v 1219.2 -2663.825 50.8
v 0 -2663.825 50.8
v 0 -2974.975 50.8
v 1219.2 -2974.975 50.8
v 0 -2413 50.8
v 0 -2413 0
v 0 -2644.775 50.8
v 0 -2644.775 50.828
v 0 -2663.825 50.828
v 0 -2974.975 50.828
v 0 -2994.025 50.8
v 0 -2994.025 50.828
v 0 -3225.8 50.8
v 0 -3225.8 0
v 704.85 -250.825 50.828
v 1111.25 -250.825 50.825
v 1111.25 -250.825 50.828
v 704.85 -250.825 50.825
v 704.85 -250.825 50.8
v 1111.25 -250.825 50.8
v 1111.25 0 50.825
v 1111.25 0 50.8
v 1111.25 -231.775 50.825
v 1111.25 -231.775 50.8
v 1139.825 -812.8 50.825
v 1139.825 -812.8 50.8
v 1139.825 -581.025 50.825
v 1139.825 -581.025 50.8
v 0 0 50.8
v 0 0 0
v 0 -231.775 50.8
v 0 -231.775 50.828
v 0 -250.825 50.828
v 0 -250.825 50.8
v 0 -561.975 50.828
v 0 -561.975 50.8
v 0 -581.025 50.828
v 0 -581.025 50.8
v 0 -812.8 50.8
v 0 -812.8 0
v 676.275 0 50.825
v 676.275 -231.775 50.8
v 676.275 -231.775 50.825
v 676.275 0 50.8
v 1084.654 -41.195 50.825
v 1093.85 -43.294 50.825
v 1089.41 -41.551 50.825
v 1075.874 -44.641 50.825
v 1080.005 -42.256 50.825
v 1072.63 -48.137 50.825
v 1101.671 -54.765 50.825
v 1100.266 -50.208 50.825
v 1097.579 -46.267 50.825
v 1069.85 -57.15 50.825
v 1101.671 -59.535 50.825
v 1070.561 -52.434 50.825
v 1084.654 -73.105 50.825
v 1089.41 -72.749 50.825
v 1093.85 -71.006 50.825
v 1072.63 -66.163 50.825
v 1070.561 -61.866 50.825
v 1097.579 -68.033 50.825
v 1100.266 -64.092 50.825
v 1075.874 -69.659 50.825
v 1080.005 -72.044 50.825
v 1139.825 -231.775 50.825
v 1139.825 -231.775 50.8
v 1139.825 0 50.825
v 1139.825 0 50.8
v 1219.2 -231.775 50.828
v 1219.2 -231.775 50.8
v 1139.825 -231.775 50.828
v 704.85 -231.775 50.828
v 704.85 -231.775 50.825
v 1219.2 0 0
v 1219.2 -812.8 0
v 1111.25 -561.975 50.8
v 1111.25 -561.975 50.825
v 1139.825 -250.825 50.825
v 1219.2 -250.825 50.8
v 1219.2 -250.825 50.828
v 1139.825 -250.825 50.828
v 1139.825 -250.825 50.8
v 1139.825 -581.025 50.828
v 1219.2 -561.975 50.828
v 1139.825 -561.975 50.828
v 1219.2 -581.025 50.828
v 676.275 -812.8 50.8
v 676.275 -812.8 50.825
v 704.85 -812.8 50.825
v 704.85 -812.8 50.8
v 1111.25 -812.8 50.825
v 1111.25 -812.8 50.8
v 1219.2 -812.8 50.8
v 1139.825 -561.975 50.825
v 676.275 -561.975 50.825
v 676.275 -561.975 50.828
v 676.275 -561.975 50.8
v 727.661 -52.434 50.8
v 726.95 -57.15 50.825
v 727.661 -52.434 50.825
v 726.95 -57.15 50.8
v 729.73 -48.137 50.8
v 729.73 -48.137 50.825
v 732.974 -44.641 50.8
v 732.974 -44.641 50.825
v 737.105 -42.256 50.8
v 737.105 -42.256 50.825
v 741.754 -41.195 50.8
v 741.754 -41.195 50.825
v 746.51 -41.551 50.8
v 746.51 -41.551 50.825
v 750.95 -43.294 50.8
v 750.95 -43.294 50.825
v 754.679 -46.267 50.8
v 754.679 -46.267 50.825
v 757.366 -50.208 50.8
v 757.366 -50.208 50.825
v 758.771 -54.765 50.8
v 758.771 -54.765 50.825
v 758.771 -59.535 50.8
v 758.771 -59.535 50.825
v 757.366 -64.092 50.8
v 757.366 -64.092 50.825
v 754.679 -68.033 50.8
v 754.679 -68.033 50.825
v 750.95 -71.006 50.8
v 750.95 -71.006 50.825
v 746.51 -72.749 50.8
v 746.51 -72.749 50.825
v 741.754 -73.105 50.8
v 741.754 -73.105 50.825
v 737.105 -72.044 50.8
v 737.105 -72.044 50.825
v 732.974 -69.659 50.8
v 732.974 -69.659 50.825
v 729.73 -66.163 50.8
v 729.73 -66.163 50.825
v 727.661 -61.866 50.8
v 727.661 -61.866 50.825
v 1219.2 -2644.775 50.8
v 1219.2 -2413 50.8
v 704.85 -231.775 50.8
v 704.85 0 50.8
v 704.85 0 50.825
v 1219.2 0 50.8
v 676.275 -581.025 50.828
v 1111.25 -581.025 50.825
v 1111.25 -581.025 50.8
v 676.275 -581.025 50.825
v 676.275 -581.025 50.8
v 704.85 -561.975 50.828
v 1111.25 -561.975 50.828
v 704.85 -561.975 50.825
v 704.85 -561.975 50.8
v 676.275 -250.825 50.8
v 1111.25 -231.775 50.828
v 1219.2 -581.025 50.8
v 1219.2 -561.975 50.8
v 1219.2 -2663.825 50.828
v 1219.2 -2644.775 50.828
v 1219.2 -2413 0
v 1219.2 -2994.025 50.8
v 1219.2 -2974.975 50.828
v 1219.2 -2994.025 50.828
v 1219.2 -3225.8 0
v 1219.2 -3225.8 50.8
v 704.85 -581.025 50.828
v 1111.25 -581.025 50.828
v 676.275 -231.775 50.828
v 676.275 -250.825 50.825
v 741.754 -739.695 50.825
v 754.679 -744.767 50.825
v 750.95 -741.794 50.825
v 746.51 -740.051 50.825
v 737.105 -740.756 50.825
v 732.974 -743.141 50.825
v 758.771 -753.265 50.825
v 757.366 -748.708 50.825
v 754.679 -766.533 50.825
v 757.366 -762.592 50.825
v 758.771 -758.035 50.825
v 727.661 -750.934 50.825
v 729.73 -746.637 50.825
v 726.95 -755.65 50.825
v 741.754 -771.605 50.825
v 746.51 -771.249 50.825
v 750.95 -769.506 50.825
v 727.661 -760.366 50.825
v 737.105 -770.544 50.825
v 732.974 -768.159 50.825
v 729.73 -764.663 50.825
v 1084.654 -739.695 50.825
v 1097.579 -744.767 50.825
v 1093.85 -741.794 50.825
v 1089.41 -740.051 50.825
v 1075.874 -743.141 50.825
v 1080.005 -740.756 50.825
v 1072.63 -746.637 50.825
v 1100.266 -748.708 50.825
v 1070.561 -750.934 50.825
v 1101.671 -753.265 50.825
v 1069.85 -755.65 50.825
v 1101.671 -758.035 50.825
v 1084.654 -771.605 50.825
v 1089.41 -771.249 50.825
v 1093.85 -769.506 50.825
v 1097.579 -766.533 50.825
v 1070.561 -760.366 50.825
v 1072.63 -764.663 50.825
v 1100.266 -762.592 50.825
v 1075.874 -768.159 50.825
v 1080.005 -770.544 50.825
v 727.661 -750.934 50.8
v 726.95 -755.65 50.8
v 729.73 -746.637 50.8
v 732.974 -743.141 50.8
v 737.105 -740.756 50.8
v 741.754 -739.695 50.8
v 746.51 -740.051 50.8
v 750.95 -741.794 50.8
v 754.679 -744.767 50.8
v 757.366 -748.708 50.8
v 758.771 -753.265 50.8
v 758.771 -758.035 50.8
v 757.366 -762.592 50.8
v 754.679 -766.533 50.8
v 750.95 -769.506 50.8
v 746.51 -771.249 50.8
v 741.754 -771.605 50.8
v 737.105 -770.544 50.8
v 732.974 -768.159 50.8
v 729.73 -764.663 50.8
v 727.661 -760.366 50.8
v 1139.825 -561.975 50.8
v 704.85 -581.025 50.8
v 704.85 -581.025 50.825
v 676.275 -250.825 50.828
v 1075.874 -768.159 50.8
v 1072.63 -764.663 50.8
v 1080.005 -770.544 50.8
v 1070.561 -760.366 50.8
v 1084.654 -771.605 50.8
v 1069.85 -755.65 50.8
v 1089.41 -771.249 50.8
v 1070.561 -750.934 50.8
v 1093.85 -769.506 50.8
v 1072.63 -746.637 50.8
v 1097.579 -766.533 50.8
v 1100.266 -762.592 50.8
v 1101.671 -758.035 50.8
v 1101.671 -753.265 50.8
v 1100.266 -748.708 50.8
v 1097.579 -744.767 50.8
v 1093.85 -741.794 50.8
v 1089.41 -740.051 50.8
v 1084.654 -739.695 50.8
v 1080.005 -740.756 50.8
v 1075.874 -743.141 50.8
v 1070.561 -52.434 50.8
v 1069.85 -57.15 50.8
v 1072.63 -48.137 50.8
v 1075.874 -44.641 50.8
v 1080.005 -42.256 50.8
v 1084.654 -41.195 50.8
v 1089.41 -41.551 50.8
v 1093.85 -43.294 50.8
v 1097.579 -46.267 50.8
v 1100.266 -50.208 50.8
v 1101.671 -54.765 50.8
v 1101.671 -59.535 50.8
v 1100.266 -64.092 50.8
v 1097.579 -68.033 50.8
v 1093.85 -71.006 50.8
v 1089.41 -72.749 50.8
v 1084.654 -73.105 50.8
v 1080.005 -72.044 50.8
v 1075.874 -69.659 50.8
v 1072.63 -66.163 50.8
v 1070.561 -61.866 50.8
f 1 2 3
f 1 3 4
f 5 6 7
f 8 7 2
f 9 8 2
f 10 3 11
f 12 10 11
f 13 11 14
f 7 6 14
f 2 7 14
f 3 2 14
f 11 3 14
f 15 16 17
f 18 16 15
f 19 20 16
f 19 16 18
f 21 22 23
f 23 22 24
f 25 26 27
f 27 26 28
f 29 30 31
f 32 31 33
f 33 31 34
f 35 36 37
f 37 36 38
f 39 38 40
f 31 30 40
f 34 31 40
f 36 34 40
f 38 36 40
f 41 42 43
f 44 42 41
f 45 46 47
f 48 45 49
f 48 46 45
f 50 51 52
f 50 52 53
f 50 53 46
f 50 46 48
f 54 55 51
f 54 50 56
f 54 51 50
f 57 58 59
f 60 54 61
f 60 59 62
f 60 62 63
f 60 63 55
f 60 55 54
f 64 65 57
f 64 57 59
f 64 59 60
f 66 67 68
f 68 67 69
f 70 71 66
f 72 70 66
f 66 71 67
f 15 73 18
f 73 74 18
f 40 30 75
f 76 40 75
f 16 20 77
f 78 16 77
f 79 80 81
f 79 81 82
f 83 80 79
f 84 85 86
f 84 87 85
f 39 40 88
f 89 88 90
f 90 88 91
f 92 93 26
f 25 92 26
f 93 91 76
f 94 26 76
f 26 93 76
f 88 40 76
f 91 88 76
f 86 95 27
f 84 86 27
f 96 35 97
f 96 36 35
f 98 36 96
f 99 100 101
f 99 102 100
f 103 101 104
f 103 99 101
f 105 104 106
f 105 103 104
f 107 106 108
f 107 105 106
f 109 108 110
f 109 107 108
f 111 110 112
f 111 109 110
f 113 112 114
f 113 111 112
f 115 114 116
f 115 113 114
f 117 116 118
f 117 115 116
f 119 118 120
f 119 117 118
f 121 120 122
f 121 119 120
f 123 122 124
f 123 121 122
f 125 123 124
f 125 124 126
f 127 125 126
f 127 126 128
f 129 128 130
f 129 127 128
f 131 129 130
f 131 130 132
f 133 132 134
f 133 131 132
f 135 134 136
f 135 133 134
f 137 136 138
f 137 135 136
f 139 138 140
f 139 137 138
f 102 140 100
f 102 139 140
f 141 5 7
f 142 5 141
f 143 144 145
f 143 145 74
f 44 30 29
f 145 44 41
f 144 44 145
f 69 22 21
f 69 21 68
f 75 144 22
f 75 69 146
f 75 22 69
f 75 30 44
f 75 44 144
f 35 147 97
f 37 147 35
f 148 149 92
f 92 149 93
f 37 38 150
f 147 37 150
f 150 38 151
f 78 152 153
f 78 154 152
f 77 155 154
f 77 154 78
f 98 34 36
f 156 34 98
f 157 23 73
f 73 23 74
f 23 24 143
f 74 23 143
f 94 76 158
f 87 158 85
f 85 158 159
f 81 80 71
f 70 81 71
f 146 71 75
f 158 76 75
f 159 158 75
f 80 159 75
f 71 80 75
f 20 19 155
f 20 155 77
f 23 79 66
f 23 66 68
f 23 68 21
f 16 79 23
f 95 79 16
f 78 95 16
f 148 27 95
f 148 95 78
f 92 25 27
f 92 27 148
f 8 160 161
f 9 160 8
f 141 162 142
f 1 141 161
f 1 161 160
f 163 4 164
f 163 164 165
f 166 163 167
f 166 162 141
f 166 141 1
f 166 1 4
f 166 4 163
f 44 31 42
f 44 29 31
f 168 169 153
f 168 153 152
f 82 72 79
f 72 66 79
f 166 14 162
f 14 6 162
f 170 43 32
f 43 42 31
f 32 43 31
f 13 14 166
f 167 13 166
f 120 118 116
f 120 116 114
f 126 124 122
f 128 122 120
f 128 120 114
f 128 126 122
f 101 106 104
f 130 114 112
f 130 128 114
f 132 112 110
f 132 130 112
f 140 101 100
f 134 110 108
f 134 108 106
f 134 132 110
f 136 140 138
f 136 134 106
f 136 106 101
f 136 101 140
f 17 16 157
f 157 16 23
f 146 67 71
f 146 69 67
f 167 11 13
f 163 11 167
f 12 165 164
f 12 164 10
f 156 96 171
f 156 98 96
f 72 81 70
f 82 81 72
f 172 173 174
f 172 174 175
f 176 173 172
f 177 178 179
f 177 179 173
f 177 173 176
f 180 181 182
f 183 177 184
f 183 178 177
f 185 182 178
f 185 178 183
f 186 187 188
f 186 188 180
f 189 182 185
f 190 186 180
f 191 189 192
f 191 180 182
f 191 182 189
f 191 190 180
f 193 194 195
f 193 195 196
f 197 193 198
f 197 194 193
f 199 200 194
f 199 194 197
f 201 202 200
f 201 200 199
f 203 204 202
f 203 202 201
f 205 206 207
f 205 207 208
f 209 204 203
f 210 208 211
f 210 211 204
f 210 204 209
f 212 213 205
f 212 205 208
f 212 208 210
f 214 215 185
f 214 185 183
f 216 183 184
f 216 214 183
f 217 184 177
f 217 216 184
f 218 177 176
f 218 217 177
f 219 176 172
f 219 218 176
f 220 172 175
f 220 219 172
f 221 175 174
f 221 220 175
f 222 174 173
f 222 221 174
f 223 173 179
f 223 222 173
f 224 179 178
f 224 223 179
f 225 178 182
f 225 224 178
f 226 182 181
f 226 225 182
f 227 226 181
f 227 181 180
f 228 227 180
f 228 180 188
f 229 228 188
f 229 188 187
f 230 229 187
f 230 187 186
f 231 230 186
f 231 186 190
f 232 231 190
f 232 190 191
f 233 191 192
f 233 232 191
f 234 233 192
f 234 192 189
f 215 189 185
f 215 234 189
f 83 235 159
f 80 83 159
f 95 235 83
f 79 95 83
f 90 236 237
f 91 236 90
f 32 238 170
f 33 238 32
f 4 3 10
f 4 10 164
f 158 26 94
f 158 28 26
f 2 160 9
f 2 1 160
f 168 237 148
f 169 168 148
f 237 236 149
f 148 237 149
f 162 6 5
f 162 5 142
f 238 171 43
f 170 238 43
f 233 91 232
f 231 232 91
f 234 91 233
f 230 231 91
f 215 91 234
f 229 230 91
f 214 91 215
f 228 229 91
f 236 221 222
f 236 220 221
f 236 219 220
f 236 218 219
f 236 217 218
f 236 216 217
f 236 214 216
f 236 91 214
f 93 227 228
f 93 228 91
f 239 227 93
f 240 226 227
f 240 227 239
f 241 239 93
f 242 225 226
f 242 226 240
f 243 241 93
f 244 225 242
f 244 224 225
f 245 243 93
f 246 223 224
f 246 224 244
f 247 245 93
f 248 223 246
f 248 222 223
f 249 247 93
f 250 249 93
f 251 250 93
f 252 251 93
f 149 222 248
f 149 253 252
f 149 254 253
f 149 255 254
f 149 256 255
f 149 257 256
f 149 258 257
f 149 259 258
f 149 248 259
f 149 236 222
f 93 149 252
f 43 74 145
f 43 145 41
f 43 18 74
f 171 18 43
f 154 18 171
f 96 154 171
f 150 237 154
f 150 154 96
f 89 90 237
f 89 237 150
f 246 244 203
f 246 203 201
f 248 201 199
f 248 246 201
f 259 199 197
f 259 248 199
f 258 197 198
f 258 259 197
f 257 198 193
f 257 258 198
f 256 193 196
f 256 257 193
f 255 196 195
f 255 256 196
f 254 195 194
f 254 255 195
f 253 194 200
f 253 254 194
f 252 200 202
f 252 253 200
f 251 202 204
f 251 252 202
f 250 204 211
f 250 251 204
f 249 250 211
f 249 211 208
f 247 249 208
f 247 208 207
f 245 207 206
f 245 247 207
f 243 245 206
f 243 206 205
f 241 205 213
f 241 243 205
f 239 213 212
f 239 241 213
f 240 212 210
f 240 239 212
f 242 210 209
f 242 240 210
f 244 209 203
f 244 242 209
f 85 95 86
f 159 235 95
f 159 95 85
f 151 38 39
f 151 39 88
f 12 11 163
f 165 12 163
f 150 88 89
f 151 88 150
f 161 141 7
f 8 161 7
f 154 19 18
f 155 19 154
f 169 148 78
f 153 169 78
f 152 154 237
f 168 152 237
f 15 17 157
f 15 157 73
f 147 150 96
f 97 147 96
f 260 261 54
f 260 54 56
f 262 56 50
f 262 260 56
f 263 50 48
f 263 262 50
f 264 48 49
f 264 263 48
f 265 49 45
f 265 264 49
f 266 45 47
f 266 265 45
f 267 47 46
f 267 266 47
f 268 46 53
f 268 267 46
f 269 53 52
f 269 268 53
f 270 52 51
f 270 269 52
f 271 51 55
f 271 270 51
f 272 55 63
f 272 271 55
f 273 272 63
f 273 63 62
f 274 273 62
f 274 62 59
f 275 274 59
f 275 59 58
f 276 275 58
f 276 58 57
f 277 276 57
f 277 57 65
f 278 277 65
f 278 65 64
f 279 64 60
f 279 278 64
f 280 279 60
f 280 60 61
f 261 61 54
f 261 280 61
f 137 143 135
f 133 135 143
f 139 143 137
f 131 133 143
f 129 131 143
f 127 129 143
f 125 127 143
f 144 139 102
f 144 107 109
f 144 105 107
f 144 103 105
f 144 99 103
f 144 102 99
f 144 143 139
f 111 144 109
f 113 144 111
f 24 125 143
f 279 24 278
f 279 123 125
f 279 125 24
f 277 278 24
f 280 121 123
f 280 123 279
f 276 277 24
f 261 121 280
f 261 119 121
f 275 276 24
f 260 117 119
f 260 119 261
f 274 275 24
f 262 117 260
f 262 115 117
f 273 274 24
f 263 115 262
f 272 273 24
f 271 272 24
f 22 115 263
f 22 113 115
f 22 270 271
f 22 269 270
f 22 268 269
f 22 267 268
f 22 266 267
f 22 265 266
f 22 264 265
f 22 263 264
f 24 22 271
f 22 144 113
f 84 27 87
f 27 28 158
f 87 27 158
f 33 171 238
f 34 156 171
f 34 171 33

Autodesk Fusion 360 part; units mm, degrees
sketch "Sketch1" plane through (0, 0, 0) normal (0, 0, 1) x (1, 0, 0)
  line L0 (0, 0) -> (0, -812.8)
  line L1 (0, -812.8) -> (0, -2413)
  line L2 (0, -2413) -> (0, -3225.8)
  line L3 (0, 0) -> (1219.2, 0)
  line L4 (1219.2, 0) -> (0, 0)
  line L5 (0, 0) -> (0, -812.8)
  line L6 (0, -812.8) -> (1219.2, -812.8)
  line L7 (1219.2, -812.8) -> (1219.2, 0)
  line L8 (0, -3225.8) -> (1219.2, -3225.8)
  line L9 (1219.2, -3225.8) -> (0, -3225.8)
  line L10 (0, -3225.8) -> (0, -2413)
  line L11 (0, -2413) -> (1219.2, -2413)
  line L12 (1219.2, -2413) -> (1219.2, -3225.8)
  dimension "d1" = 812.8
  dimension "d2" = 1600.2
  dimension "d3" = 812.8
  dimension "d4" = 1219.2
  dimension "d5" = 1219.2
extrude "Extrude1" add sketch "Sketch1" along normal blind 50.8 makes body 1 at (406.4, -270.9333, 0) makes body 2 at (812.8, -2954.8667, 0)
sketch "Sketch2" plane through (0, 0, 50.8) normal (0, 0, 1) x (-1, 0, 0)
  line L0 (-1219.2, 2413) -> (0, 2413)
  line L1 (0, 2413) -> (0, 3225.8)
  line L2 (0, 3225.8) -> (-1219.2, 3225.8)
  line L3 (-1219.2, 3225.8) -> (-1219.2, 2413)
  line L4 (-106.2446, 261.963) -> (-283.0518, 261.963) construction
  line L5 (-283.0518, 261.963) -> (-283.0518, 108.5567) construction
  line L6 (-283.0518, 108.5567) -> (-106.2446, 108.5567) construction
  line L7 (-106.2446, 108.5567) -> (-106.2446, 261.963) construction
  dimension "d8" = 152.4
sketch "Sketch3" plane through (0, 0, 50.8) normal (0, 0, 1) x (-1, 0, 0)
  line L0 (-1219.2, 812.8) -> (-1219.2, 0)
  line L1 (-1219.2, 0) -> (0, 0)
  line L2 (0, 0) -> (0, 812.8)
  line L3 (0, 812.8) -> (-1219.2, 812.8)
  line L4 (-1219.2, 406.4) -> (-1139.825, 406.4)
  line L5 (-1139.825, 406.4) -> (-1111.25, 406.4)
  line L6 (-1111.25, 406.4) -> (-1111.25, 0)
  line L7 (-1111.25, 0) -> (-1139.825, 0)
  line L8 (-1139.825, 0) -> (-1139.825, 406.4)
  line L9 (-1139.825, 406.4) -> (-1111.25, 406.4)
  line L10 (-1111.25, 406.4) -> (-1111.25, 812.8)
  line L11 (-1111.25, 812.8) -> (-1139.825, 812.8)
  line L12 (-1139.825, 812.8) -> (-1139.825, 406.4)
  line L13 (-1219.2, 406.4) -> (-704.85, 406.4)
  line L14 (-704.85, 406.4) -> (-676.275, 406.4)
  line L15 (-676.275, 406.4) -> (-676.275, 0)
  line L16 (-676.275, 0) -> (-704.85, 0)
  line L17 (-704.85, 0) -> (-704.85, 406.4)
  line L18 (-676.275, 406.4) -> (-704.85, 406.4)
  line L19 (-704.85, 406.4) -> (-704.85, 812.8)
  line L20 (-704.85, 812.8) -> (-676.275, 812.8)
  line L21 (-676.275, 812.8) -> (-676.275, 406.4)
  dimension "d9" = 79.375
  dimension "d10" = 28.575
  dimension "d11" = 28.575
  dimension "d12" = 514.35
  dimension "d13" = 28.575
  dimension "d14" = 28.575
extrude "Extrude2" add sketch "Sketch3" along normal blind 0.0254 contours L3 L5 L9 L10 L11 L12 L13 | L1 L5 L6 L7 L8 L9 L13 | L3 L14 L18 L19 L20 L21 | L1 L14 L15 L16 L17 L18 bodies 1
sketch "Sketch4" plane through (0, 0, 50.8) normal (0, 0, 1) x (-1, 0, 0)
  line L0 (-676.275, 812.8) -> (-676.275, 0)
  line L1 (-676.275, 0) -> (0, 0)
  line L2 (0, 0) -> (0, 812.8)
  line L3 (0, 812.8) -> (-676.275, 812.8)
  line L4 (-1111.25, 812.8) -> (-1111.25, 0)
  line L5 (-1111.25, 0) -> (-704.85, 0)
  line L6 (-704.85, 0) -> (-704.85, 812.8)
  line L7 (-704.85, 812.8) -> (-1111.25, 812.8)
  line L8 (-1139.825, 0) -> (-1139.825, 812.8)
  line L9 (-1139.825, 812.8) -> (-1219.2, 812.8)
  line L10 (-1219.2, 812.8) -> (-1219.2, 0)
  line L11 (-1219.2, 0) -> (-1139.825, 0)
  line L12 (-704.85, 0) -> (-1111.25, 0)
  line L13 (-1111.25, 0) -> (-1111.25, 57.15)
  line L14 (-704.85, 57.15) -> (-704.85, 0)
  line L15 (-704.85, 812.8) -> (-1111.25, 812.8)
  line L16 (-1111.25, 812.8) -> (-1111.25, 755.65)
  line L17 (-704.85, 755.65) -> (-704.85, 812.8)
  circle A0 centre (-742.95, 57.15) radius 16
  circle A1 centre (-1085.85, 57.15) radius 16
  circle A2 centre (-742.95, 755.65) radius 16
  circle A3 centre (-1085.85, 755.65) radius 16
  dimension "d19" = 57.15
  dimension "d20" = 57.15
  dimension "d21" = 32
  dimension "d22" = 32
  dimension "d23" = 32
  dimension "d24" = 32
extrude "Extrude3" add sketch "Sketch4" along normal blind 0.0254 contours A0 | A1 | A2 | A3 bodies 1
sketch "Sketch5" plane through (0, 0, 50.8) normal (0, 0, 1) x (-1, 0, 0)
sketch "Sketch6" plane through (0, 0, 50.8) normal (0, 0, 1) x (-1, 0, 0)
  line L0 (-676.275, 812.8) -> (-676.275, 0)
  line L1 (-676.275, 0) -> (0, 0)
  line L2 (0, 0) -> (0, 812.8)
  line L3 (0, 812.8) -> (-676.275, 812.8)
  line L4 (-676.275, 250.825) -> (0, 250.825)
  line L5 (-676.275, 231.775) -> (0, 231.775)
  line L6 (0, 561.975) -> (-676.275, 561.975)
  line L7 (0, 581.025) -> (-676.275, 581.025)
  dimension "d27" = -250.825
  dimension "d28" = -231.775
  dimension "d29" = -250.825
  dimension "d30" = -231.775
extrude "Extrude4" add sketch "Sketch6" along normal blind 0.0279 contours L0 L2 L4 L5 bodies 1
extrude "Extrude5" add sketch "Sketch6" along normal blind 0.0279 contours L0 L2 L6 L7 bodies 1
sketch "Sketch7" plane through (0, 0, 50.8) normal (0, 0, 1) x (-1, 0, 0)
  circle A0 centre (-742.95, 755.65) radius 16
  circle A1 centre (-742.95, 57.15) radius 16
  circle A2 centre (-1085.85, 755.65) radius 16
  circle A3 centre (-1085.85, 57.15) radius 16
  line L0 (-1111.25, 812.8) -> (-1111.25, 0)
  line L1 (-1111.25, 0) -> (-704.85, 0)
  line L2 (-704.85, 0) -> (-704.85, 812.8)
  line L3 (-704.85, 812.8) -> (-1111.25, 812.8)
  line L4 (-1111.25, 250.825) -> (-704.85, 250.825)
  line L5 (-1111.25, 231.775) -> (-704.85, 231.775)
  line L6 (-704.85, 561.975) -> (-1111.25, 561.975)
  line L7 (-704.85, 581.025) -> (-1111.25, 581.025)
  dimension "d35" = -250.825
  dimension "d36" = -231.775
  dimension "d37" = -250.825
  dimension "d38" = -231.775
extrude "Extrude6" add sketch "Sketch7" along normal blind 0.0279 contours L0 L2 L6 L7 | L0 L2 L4 L5 bodies 1
sketch "Sketch8" plane through (0, 0, 50.8) normal (0, 0, 1) x (-1, 0, 0)
  line L0 (-1139.825, 0) -> (-1139.825, 812.8)
  line L1 (-1139.825, 812.8) -> (-1219.2, 812.8)
  line L2 (-1219.2, 812.8) -> (-1219.2, 0)
  line L3 (-1219.2, 0) -> (-1139.825, 0)
  line L4 (-1219.2, 250.825) -> (-1139.825, 250.825)
  line L5 (-1219.2, 231.775) -> (-1139.825, 231.775)
  line L6 (-1139.825, 561.975) -> (-1219.2, 561.975)
  line L7 (-1139.825, 581.025) -> (-1219.2, 581.025)
  dimension "d41" = -250.825
  dimension "d42" = -231.775
  dimension "d43" = -250.825
  dimension "d44" = -231.775
extrude "Extrude7" add sketch "Sketch8" along normal blind 0.0279 contours L0 L2 L6 L7 bodies 1
extrude "Extrude8" add sketch "Sketch8" along normal blind 0.0279 contours L0 L2 L4 L5 bodies 1
sketch "Sketch9" plane through (0, 0, 50.8) normal (0, 0, 1) x (-1, 0, 0)
  line L0 (-1219.2, 2413) -> (0, 2413)
  line L1 (0, 2413) -> (0, 3225.8)
  line L2 (0, 3225.8) -> (-1219.2, 3225.8)
  line L3 (-1219.2, 3225.8) -> (-1219.2, 2413)
  line L4 (-1219.2, 2663.825) -> (0, 2663.825)
  line L5 (-1219.2, 2644.775) -> (0, 2644.775)
  line L6 (0, 2974.975) -> (-1219.2, 2974.975)
  line L7 (0, 2994.025) -> (-1219.2, 2994.025)
  dimension "d49" = -250.825
  dimension "d50" = -231.775
  dimension "d51" = -250.825
  dimension "d52" = -231.775
extrude "Extrude9" add sketch "Sketch9" along normal blind 0.0279 contours L1 L3 L4 L5 | L1 L3 L6 L7 bodies 2
equation "d4 = ( 24 * 2 ) * 1 in"
equation "d5 = ( 24 * 2 ) * 1 in"
